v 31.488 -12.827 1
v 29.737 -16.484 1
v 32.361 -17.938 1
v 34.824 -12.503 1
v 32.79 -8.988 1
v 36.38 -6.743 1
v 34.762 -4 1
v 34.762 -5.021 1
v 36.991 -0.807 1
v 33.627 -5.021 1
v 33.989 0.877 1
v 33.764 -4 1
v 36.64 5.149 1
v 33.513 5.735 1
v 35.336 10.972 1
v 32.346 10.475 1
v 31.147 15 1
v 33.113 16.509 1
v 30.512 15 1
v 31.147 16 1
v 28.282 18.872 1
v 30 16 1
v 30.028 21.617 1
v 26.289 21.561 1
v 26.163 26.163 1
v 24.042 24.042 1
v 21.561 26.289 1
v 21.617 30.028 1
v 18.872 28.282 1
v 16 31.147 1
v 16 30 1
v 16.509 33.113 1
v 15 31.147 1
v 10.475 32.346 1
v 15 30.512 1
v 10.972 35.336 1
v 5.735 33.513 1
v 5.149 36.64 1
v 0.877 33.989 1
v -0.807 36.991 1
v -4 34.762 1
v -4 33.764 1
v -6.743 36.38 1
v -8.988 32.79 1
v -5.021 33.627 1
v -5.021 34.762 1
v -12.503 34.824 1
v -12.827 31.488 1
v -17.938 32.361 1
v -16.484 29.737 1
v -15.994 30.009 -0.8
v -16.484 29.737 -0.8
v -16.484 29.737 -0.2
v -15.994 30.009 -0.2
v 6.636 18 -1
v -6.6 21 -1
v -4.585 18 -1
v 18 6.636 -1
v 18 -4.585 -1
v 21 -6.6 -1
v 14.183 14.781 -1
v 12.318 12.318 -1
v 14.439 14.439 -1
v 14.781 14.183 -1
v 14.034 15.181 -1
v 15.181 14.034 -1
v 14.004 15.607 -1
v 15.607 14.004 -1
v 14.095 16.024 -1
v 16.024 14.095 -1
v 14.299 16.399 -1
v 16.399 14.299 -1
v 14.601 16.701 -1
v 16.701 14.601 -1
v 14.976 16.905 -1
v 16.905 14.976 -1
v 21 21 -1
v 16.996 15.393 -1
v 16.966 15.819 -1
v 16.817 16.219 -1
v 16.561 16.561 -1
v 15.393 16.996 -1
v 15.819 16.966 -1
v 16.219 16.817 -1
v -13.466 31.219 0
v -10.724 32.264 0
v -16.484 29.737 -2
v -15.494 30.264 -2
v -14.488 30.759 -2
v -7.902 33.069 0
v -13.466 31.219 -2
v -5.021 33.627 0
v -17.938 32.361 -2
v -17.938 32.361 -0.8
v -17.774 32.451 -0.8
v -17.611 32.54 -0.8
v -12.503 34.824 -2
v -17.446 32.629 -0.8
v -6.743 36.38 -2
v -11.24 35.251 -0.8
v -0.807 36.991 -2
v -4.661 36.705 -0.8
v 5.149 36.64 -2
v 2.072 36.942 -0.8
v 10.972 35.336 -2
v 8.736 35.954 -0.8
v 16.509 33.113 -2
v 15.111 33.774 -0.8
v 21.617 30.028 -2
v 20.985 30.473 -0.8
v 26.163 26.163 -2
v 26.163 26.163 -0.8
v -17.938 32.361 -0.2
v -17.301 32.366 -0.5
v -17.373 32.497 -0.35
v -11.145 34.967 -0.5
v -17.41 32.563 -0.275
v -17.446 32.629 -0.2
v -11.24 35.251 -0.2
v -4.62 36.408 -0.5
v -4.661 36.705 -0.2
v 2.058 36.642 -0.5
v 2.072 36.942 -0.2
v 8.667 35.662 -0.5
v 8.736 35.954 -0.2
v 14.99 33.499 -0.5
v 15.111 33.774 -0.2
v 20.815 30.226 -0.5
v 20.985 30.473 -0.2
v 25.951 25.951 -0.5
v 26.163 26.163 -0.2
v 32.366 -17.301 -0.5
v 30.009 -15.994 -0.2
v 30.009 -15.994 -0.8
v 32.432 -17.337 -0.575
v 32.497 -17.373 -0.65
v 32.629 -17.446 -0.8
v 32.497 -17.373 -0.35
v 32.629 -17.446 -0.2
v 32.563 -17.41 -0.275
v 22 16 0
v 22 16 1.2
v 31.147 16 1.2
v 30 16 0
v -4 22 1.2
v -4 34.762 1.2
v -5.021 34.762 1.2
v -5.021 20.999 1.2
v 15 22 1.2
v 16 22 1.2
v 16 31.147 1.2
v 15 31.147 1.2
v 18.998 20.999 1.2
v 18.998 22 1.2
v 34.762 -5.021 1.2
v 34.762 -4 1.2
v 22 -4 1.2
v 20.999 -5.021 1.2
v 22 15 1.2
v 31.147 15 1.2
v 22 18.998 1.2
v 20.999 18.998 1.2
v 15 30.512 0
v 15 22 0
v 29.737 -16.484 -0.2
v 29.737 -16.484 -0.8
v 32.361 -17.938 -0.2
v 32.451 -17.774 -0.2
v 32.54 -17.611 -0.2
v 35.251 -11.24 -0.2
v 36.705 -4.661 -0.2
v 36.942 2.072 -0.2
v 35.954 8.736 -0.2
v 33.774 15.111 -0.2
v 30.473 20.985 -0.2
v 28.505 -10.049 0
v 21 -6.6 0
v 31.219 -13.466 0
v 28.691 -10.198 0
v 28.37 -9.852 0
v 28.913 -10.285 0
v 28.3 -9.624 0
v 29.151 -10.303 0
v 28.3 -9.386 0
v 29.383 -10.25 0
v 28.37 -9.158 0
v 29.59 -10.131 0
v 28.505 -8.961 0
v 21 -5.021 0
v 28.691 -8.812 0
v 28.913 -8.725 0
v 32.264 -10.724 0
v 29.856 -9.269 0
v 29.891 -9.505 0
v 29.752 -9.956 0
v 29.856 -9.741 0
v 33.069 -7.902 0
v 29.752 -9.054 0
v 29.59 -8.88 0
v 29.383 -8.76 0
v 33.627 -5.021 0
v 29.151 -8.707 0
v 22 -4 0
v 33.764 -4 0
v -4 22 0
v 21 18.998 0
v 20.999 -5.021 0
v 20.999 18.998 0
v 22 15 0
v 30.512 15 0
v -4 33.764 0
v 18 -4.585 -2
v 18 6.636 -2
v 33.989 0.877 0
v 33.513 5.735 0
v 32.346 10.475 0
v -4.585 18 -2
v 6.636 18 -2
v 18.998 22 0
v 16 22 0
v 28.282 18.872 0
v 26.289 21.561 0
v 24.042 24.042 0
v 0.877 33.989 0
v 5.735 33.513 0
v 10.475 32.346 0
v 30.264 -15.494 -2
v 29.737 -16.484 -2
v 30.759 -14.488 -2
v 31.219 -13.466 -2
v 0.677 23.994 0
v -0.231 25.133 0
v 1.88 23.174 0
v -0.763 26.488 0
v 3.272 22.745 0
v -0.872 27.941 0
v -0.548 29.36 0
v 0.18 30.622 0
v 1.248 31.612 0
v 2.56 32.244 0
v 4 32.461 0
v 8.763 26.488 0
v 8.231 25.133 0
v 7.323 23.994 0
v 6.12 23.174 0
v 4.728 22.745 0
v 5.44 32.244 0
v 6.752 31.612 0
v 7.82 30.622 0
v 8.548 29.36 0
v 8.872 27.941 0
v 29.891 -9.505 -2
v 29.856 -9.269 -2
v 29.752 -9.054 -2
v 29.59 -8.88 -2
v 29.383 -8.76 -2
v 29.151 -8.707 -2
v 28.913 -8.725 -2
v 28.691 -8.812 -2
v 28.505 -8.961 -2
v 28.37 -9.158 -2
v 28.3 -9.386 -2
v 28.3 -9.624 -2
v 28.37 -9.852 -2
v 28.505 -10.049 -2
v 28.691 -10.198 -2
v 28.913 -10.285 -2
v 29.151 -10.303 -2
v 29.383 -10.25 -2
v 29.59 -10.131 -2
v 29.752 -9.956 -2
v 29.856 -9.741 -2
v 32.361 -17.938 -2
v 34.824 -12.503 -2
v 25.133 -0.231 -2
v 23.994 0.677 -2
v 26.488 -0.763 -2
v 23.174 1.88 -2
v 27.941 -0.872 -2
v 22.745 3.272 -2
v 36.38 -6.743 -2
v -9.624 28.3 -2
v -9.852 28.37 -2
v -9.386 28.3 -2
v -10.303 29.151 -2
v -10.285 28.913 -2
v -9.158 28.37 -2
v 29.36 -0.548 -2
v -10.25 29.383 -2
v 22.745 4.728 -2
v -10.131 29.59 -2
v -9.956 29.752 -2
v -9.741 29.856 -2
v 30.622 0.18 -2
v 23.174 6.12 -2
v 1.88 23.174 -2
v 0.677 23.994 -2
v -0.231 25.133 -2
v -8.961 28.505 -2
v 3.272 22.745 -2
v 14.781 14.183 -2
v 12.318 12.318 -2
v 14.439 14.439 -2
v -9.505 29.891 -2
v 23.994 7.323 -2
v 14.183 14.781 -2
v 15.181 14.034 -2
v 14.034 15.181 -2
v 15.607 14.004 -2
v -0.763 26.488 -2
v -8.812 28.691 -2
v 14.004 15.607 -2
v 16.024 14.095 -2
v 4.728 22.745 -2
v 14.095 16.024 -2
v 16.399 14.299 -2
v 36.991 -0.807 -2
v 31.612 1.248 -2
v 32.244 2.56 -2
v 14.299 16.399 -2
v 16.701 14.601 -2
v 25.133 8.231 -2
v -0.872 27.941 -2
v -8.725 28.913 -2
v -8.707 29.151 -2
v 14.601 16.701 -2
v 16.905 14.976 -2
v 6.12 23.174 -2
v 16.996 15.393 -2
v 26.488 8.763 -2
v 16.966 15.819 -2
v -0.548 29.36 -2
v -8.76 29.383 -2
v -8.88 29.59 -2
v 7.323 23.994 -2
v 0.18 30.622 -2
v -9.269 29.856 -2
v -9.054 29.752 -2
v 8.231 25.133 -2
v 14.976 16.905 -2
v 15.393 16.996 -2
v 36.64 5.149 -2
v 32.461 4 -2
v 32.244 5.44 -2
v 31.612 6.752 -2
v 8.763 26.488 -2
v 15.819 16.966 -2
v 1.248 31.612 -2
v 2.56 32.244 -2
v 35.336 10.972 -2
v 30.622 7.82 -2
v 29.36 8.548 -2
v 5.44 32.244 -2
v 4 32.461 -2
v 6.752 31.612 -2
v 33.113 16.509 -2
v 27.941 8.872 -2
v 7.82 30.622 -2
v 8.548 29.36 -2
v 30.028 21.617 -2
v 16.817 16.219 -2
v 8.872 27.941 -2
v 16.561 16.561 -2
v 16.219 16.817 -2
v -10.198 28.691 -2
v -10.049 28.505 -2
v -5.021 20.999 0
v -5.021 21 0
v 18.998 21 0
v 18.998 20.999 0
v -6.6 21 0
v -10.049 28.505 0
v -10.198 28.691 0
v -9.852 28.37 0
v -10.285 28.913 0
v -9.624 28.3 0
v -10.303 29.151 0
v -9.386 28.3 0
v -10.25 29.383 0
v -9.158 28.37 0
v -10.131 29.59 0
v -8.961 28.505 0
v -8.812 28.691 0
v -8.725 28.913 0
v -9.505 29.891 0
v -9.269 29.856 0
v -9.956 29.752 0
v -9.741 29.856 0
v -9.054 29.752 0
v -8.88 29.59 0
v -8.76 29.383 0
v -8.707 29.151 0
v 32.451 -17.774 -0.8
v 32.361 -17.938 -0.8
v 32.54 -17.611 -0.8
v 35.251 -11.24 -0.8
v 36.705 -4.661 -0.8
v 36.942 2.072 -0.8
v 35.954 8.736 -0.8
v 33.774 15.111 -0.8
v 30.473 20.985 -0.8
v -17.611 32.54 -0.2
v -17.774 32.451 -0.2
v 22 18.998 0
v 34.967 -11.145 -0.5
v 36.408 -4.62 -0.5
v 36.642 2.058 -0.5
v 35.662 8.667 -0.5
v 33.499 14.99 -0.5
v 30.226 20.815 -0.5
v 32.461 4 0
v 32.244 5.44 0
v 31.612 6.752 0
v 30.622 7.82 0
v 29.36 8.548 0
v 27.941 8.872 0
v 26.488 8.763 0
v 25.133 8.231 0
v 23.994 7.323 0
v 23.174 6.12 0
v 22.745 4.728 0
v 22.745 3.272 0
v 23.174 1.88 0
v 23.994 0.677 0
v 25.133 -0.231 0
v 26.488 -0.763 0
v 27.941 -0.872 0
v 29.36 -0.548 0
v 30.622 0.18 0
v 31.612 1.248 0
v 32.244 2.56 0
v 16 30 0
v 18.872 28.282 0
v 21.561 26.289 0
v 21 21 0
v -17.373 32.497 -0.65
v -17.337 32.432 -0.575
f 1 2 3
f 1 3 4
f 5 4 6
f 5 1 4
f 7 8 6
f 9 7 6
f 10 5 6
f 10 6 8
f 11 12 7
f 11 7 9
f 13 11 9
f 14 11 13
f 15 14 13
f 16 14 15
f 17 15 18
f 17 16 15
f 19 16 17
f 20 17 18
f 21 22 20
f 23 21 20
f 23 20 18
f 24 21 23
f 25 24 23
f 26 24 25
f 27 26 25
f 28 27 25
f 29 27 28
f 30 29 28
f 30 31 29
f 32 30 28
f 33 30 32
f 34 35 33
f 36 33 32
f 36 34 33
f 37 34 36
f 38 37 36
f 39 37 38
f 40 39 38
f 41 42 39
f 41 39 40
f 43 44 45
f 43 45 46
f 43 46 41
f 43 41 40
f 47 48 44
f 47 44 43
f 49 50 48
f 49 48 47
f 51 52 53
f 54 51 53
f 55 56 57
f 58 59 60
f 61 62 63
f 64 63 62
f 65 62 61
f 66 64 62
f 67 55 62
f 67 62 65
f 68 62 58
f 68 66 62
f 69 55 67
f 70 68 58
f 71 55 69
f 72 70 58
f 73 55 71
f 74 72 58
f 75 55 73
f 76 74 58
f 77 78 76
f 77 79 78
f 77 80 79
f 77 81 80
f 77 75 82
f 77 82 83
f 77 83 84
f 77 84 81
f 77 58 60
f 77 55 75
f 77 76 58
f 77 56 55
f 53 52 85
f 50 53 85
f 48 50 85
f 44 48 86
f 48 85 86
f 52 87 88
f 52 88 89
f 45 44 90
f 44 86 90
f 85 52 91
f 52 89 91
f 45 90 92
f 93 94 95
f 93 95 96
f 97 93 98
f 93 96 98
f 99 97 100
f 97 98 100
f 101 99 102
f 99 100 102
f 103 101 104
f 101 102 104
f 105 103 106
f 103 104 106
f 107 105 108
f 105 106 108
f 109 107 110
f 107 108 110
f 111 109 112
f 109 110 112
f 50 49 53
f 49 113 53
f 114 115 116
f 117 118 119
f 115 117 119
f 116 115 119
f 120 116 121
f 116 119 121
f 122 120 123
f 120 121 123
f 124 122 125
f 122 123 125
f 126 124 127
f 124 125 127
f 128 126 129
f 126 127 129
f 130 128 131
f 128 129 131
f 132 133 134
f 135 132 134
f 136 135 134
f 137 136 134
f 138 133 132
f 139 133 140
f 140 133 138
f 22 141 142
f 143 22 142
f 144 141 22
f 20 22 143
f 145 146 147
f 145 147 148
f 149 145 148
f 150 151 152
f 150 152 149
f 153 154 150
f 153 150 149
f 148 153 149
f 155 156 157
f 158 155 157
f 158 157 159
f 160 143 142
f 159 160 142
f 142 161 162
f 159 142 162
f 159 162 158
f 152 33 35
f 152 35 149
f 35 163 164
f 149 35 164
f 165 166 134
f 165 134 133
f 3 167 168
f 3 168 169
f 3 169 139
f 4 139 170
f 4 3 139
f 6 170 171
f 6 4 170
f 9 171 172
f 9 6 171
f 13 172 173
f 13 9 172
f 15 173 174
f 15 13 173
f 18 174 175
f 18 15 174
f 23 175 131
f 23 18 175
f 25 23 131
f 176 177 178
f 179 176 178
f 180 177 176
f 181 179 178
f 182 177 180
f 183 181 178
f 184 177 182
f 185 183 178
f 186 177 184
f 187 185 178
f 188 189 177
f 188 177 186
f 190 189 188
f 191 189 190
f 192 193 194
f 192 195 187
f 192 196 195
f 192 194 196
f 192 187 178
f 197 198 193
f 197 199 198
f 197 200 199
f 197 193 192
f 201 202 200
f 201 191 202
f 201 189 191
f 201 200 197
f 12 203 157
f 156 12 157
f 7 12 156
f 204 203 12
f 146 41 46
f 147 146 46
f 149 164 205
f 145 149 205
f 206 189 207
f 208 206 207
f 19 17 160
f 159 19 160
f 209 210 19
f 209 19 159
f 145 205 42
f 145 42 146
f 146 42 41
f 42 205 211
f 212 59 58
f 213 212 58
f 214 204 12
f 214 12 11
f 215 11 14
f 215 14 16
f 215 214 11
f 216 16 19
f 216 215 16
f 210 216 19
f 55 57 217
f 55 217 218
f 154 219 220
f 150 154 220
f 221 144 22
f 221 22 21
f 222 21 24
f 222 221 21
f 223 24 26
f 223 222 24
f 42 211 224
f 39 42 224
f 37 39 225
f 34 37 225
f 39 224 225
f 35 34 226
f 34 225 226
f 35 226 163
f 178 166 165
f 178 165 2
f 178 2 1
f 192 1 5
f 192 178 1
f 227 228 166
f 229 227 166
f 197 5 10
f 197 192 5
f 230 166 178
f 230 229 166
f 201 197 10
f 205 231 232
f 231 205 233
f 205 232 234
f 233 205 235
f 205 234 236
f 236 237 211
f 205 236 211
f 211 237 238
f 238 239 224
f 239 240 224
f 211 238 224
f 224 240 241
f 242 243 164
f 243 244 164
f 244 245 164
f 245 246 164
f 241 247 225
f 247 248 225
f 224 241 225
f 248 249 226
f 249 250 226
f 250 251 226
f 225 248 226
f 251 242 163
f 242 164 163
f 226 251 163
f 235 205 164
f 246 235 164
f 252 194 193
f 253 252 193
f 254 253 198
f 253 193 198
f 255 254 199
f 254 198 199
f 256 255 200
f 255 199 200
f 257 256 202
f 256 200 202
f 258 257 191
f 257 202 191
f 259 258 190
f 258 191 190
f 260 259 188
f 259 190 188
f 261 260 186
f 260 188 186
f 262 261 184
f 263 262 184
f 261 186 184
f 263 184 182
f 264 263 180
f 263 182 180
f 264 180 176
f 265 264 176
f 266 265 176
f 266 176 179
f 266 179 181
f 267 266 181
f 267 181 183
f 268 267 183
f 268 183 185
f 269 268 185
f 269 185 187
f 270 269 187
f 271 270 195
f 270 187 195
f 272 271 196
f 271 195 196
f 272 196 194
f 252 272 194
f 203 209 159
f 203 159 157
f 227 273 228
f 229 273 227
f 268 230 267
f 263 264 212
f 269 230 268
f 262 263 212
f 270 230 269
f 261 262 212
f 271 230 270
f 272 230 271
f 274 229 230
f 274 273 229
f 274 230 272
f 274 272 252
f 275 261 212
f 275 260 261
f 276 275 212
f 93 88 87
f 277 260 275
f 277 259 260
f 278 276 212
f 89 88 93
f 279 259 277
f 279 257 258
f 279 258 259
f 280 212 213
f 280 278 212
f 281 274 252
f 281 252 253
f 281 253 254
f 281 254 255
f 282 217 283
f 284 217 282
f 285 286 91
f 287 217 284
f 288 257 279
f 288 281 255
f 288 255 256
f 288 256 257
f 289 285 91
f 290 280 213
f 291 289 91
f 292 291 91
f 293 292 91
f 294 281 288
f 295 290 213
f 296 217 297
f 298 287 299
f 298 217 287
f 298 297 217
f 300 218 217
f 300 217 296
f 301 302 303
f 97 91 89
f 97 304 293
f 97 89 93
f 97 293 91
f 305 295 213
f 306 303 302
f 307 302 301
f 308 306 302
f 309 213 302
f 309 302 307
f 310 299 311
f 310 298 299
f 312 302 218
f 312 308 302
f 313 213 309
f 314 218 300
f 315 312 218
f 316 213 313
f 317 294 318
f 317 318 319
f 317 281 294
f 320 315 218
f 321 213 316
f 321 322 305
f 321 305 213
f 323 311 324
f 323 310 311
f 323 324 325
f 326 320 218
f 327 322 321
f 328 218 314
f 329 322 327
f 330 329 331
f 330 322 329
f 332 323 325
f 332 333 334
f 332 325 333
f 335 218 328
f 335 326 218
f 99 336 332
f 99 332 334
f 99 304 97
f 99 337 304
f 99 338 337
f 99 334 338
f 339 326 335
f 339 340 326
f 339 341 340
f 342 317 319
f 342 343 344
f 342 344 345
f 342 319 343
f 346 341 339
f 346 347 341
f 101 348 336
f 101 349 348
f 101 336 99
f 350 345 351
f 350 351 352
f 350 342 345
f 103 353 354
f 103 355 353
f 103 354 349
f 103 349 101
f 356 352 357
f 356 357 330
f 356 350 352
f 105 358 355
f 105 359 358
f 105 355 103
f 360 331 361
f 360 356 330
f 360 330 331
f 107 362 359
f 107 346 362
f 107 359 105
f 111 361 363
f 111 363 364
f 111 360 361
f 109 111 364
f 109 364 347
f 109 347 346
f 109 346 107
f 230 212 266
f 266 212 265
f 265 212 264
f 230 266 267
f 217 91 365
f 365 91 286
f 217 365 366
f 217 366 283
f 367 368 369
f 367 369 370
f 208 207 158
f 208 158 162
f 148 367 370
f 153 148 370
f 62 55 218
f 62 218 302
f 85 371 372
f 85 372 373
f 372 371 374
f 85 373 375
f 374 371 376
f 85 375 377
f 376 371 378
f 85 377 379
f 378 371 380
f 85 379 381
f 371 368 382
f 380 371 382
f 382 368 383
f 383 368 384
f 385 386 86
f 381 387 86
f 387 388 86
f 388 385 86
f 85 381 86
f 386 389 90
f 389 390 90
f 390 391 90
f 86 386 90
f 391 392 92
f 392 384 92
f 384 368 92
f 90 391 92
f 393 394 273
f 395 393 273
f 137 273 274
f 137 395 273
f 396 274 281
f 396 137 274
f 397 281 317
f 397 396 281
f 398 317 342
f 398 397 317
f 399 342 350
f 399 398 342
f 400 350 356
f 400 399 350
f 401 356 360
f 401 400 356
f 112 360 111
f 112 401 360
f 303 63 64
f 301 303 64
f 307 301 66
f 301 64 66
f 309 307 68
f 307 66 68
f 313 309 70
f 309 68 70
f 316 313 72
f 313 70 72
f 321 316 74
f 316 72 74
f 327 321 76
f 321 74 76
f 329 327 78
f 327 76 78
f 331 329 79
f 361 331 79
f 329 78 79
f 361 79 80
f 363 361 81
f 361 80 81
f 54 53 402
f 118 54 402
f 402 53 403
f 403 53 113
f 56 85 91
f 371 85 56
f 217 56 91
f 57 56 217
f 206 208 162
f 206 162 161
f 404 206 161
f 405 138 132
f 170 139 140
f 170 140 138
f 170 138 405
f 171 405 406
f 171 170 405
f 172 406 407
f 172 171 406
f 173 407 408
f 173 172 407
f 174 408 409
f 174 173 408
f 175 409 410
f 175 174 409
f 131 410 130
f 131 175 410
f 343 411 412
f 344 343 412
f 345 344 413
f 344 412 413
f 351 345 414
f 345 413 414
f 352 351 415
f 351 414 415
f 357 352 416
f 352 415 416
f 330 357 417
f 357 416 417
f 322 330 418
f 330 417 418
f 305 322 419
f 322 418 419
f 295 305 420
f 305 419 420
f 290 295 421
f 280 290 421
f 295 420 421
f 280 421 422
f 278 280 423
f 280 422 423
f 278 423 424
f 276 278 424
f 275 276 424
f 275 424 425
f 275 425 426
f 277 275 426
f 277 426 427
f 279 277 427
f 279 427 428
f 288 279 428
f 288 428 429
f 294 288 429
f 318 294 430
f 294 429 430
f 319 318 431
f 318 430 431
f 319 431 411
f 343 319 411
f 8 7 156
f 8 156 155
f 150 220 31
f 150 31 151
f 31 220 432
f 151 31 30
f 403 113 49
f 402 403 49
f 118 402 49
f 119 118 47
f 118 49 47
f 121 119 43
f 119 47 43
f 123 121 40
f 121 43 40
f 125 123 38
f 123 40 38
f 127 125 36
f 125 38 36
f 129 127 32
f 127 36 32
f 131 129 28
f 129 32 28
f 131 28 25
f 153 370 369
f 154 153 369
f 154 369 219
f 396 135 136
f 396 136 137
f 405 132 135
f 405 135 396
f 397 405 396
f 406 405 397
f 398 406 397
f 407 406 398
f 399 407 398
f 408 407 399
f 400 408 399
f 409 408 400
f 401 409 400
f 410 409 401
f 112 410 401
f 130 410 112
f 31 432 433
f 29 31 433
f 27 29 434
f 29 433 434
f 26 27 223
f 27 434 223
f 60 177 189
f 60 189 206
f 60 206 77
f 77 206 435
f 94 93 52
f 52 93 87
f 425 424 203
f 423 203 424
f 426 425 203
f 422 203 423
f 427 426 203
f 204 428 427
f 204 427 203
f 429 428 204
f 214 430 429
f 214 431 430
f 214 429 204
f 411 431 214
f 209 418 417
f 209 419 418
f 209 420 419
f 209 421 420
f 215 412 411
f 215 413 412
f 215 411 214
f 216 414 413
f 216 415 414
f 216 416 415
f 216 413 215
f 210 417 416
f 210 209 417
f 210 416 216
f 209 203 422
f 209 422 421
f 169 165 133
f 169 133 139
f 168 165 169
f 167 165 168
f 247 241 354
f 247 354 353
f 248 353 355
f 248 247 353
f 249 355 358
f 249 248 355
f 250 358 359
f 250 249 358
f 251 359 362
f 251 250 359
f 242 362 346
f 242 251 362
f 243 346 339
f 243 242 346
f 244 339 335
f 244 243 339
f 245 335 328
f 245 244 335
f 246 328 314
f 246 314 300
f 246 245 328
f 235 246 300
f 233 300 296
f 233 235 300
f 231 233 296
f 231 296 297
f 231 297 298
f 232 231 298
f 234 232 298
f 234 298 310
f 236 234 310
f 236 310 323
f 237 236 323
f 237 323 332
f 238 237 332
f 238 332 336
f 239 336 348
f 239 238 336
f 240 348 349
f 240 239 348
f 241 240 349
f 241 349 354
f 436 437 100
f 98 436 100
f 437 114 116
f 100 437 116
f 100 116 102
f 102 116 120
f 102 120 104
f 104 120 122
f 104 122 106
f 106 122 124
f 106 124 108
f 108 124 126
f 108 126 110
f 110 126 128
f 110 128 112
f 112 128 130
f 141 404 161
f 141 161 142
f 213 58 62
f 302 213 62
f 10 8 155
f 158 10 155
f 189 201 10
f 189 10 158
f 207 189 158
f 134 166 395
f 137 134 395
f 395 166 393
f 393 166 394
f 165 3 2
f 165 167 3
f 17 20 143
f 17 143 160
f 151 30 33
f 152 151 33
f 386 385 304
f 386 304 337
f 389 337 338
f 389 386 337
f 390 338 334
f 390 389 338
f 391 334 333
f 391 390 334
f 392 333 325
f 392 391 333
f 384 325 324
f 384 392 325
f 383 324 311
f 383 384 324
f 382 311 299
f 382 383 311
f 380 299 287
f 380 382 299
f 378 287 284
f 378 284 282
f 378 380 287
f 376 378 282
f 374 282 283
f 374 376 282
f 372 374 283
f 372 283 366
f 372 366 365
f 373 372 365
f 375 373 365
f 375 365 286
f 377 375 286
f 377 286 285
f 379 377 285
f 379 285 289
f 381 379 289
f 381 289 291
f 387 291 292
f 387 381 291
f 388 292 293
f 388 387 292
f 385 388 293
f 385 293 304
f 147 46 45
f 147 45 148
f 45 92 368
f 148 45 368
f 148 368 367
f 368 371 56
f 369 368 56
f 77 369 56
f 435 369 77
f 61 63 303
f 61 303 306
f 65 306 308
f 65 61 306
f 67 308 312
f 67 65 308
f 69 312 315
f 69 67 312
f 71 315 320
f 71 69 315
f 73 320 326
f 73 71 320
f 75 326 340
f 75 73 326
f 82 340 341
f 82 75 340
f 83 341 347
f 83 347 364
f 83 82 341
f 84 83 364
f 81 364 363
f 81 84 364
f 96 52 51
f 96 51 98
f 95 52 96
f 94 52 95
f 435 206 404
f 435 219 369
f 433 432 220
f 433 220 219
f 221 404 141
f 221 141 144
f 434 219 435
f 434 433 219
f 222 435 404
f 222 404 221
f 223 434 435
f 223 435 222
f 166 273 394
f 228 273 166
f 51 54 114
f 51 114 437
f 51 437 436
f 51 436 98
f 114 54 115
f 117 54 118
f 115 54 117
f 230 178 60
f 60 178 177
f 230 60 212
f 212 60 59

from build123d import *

# Parameters (mm, degrees)
SKETCH004_W                    = 42
SKETCH004_H                    = 42
PAD001_DEPTH                   = 1
SKETCH003_R                    = 4.8856059565
SKETCH003_R_2                  = 0.8
PAD_DEPTH                      = 2
PAD002_DEPTH                   = 1.2
SKETCH008_W                    = 3
SKETCH008_H                    = 0.6
POCKET_DEPTH                   = 0.56
PART_MIRRORING_PLACEMENT_ANGLE = 90.0000000001


with BuildPart() as sweep_body:
    # Sweep: sweep along a path in Sketch002
    with BuildLine(Plane.XY) as sweep_path:
        ThreePointArc((30.6116897499, -16.9683367086), (34.659382406, 4.8710585336), (24.7487373415, 24.7487373415))
    # Sketch → Sweep (sweep)
    with BuildSketch(Plane(origin=(0, 0, -2), x_dir=(1, 0, 0), z_dir=(0, -1, 0))):
        Polygon((34, 3), (37, 3), (37, 1.8), (36.7, 1.5), (37, 1.2), (37, 0), (34, 0), align=None)
    sweep(path=sweep_path.line)


with BuildPart() as pad001:
    # Sketch004 → Pad001 (new body)
    with BuildSketch(Plane.XY):
        Rectangle(SKETCH004_W, SKETCH004_H)
    extrude(amount=-PAD001_DEPTH)


with BuildPart() as pocket:
    # Sketch003 → Pad (new body)
    with BuildSketch(Plane.XY):
        with BuildLine():
            ThreePointArc((32.0633897526, -14.0334969831), (34.3936021818, 6.4869198359), (24.7487373415, 24.7487373415))
            Line((24.7487373415, 24.7487373415), (16.5606601718, 16.5606601718))
            ThreePointArc((14.4393398282, 14.4393398282), (16.5606601718, 14.4393398282), (16.5606601718, 16.5606601718))
            Line((14.4393398282, 14.4393398282), (12.3180194847, 12.3180194847))
            Line((18, 6.6360389693), (12.3180194847, 12.3180194847))
            Line((18, -4.584534), (18, 6.6360389693))
            Line((32.0633897526, -14.0334969831), (18, -4.584534))
        make_face()
        with Locations((27.575581, 4)):
            Circle(SKETCH003_R, mode=Mode.SUBTRACT)
        with Locations((29.091162, -9.5051)):
            Circle(SKETCH003_R_2, mode=Mode.SUBTRACT)
    extrude(amount=-PAD_DEPTH)

    # Cut: cut Pad001
    add(pad001.part, mode=Mode.SUBTRACT)

    # Fusion: union Sweep body
    add(sweep_body.part)

    # Sketch007 → Pad002 (new body)
    with BuildSketch(Plane.XY):
        Polygon((20.99856, 18.998371), (22, 18.998371), (22, 16), (31.146767, 16), (31.146767, 14.999727), (22, 14.999727), (22, -4), (34.761593, -4), (34.761593, -5.021452), (20.99856, -5.021452), align=None)
    extrude(amount=PAD002_DEPTH)

    # Sketch008 → Pocket (cut)
    with BuildSketch(Plane(origin=(0, 0, 0), x_dir=(0.8746197071, -0.4848096202, 0), z_dir=(-0.4848096202, -0.8746197071, 0))):
        with Locations((35.5, -0.5)):
            Rectangle(SKETCH008_W, SKETCH008_H)
    extrude(amount=-POCKET_DEPTH, mode=Mode.SUBTRACT)


with BuildPart() as fusion001:
    # Part__Mirroring: instance of Pocket
    add(pocket.part.mirror(Plane(origin=(0, 0, 0), x_dir=(1, 0, 0), z_dir=(0, 1, 0))))


with BuildPart() as fusion001_1:
    # Part__Mirroring placement: moved
    add(fusion001.part.rotate(Axis((0, 0, 0), (0, 0, 1)), PART_MIRRORING_PLACEMENT_ANGLE))

    # Fusion001: union Pocket
    add(pocket.part)


solid = fusion001_1.part
